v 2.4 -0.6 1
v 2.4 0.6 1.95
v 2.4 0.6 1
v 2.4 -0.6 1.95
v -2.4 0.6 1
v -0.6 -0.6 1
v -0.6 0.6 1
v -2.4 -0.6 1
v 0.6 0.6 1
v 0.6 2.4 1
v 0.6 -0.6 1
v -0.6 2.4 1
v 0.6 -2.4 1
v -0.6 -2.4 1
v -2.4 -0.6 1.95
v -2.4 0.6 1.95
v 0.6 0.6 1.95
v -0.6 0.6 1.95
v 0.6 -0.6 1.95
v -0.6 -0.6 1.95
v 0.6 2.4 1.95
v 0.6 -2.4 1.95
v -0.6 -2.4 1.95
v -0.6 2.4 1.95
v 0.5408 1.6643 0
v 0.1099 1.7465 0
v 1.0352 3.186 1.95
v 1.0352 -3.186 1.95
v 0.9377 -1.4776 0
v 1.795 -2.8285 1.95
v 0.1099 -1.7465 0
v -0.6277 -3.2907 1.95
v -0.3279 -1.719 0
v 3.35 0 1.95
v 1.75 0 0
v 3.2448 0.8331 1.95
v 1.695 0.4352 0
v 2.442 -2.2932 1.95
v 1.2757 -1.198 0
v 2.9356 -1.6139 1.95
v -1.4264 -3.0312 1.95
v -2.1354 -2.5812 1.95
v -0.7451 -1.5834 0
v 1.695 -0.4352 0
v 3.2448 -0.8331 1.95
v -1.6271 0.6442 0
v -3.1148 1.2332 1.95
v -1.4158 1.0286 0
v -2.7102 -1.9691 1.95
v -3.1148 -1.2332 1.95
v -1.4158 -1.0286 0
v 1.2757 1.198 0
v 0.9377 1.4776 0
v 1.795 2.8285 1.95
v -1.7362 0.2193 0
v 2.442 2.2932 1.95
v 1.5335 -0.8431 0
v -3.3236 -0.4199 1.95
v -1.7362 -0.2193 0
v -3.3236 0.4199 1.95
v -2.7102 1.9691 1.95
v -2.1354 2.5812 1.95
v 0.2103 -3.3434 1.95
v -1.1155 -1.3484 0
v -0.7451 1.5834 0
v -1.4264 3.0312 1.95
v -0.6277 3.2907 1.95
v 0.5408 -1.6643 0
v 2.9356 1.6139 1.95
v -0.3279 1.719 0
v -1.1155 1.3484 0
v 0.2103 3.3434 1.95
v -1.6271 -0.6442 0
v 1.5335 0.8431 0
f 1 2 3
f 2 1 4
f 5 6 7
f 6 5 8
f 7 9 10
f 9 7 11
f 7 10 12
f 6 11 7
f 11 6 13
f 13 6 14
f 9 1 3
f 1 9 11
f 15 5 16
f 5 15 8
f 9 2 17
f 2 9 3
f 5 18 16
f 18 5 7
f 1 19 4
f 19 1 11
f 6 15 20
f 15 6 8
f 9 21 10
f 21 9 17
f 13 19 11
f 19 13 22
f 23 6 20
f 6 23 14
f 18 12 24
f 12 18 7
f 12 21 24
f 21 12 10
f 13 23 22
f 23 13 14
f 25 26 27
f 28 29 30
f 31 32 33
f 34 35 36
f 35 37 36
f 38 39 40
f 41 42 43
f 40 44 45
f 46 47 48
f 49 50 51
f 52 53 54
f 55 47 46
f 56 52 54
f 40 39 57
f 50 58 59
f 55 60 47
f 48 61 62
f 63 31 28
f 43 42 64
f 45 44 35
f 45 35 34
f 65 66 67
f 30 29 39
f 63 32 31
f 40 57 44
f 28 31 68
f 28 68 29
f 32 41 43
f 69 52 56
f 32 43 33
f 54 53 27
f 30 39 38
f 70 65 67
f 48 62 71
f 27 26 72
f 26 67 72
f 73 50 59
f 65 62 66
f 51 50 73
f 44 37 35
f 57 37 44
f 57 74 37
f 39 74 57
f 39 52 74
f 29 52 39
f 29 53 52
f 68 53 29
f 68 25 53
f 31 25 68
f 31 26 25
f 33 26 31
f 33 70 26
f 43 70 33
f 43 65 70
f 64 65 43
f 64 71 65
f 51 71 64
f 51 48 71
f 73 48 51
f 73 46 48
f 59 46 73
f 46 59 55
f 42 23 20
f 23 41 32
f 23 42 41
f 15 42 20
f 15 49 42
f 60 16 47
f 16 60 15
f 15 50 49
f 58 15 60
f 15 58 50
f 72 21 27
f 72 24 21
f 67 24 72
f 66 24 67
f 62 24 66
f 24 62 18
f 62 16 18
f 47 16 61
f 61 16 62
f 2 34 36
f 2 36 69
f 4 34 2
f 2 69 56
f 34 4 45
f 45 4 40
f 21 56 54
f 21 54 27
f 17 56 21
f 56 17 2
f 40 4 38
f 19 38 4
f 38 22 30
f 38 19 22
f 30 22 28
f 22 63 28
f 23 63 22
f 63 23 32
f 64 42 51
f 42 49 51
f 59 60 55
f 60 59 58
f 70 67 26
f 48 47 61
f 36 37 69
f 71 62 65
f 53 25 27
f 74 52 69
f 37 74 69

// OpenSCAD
alt = 2;
larg=4.8;
comp=1.2;

difference(){

 cylinder(h=1.95, r1=1.75, r2=3.35, center=false,$fn=25);
union(){translate([-2.4,-.6,1]) cube([larg,comp,alt-1]);
translate([-.6,-2.4,1]) cube([comp,larg,alt-1]);}
}

 
